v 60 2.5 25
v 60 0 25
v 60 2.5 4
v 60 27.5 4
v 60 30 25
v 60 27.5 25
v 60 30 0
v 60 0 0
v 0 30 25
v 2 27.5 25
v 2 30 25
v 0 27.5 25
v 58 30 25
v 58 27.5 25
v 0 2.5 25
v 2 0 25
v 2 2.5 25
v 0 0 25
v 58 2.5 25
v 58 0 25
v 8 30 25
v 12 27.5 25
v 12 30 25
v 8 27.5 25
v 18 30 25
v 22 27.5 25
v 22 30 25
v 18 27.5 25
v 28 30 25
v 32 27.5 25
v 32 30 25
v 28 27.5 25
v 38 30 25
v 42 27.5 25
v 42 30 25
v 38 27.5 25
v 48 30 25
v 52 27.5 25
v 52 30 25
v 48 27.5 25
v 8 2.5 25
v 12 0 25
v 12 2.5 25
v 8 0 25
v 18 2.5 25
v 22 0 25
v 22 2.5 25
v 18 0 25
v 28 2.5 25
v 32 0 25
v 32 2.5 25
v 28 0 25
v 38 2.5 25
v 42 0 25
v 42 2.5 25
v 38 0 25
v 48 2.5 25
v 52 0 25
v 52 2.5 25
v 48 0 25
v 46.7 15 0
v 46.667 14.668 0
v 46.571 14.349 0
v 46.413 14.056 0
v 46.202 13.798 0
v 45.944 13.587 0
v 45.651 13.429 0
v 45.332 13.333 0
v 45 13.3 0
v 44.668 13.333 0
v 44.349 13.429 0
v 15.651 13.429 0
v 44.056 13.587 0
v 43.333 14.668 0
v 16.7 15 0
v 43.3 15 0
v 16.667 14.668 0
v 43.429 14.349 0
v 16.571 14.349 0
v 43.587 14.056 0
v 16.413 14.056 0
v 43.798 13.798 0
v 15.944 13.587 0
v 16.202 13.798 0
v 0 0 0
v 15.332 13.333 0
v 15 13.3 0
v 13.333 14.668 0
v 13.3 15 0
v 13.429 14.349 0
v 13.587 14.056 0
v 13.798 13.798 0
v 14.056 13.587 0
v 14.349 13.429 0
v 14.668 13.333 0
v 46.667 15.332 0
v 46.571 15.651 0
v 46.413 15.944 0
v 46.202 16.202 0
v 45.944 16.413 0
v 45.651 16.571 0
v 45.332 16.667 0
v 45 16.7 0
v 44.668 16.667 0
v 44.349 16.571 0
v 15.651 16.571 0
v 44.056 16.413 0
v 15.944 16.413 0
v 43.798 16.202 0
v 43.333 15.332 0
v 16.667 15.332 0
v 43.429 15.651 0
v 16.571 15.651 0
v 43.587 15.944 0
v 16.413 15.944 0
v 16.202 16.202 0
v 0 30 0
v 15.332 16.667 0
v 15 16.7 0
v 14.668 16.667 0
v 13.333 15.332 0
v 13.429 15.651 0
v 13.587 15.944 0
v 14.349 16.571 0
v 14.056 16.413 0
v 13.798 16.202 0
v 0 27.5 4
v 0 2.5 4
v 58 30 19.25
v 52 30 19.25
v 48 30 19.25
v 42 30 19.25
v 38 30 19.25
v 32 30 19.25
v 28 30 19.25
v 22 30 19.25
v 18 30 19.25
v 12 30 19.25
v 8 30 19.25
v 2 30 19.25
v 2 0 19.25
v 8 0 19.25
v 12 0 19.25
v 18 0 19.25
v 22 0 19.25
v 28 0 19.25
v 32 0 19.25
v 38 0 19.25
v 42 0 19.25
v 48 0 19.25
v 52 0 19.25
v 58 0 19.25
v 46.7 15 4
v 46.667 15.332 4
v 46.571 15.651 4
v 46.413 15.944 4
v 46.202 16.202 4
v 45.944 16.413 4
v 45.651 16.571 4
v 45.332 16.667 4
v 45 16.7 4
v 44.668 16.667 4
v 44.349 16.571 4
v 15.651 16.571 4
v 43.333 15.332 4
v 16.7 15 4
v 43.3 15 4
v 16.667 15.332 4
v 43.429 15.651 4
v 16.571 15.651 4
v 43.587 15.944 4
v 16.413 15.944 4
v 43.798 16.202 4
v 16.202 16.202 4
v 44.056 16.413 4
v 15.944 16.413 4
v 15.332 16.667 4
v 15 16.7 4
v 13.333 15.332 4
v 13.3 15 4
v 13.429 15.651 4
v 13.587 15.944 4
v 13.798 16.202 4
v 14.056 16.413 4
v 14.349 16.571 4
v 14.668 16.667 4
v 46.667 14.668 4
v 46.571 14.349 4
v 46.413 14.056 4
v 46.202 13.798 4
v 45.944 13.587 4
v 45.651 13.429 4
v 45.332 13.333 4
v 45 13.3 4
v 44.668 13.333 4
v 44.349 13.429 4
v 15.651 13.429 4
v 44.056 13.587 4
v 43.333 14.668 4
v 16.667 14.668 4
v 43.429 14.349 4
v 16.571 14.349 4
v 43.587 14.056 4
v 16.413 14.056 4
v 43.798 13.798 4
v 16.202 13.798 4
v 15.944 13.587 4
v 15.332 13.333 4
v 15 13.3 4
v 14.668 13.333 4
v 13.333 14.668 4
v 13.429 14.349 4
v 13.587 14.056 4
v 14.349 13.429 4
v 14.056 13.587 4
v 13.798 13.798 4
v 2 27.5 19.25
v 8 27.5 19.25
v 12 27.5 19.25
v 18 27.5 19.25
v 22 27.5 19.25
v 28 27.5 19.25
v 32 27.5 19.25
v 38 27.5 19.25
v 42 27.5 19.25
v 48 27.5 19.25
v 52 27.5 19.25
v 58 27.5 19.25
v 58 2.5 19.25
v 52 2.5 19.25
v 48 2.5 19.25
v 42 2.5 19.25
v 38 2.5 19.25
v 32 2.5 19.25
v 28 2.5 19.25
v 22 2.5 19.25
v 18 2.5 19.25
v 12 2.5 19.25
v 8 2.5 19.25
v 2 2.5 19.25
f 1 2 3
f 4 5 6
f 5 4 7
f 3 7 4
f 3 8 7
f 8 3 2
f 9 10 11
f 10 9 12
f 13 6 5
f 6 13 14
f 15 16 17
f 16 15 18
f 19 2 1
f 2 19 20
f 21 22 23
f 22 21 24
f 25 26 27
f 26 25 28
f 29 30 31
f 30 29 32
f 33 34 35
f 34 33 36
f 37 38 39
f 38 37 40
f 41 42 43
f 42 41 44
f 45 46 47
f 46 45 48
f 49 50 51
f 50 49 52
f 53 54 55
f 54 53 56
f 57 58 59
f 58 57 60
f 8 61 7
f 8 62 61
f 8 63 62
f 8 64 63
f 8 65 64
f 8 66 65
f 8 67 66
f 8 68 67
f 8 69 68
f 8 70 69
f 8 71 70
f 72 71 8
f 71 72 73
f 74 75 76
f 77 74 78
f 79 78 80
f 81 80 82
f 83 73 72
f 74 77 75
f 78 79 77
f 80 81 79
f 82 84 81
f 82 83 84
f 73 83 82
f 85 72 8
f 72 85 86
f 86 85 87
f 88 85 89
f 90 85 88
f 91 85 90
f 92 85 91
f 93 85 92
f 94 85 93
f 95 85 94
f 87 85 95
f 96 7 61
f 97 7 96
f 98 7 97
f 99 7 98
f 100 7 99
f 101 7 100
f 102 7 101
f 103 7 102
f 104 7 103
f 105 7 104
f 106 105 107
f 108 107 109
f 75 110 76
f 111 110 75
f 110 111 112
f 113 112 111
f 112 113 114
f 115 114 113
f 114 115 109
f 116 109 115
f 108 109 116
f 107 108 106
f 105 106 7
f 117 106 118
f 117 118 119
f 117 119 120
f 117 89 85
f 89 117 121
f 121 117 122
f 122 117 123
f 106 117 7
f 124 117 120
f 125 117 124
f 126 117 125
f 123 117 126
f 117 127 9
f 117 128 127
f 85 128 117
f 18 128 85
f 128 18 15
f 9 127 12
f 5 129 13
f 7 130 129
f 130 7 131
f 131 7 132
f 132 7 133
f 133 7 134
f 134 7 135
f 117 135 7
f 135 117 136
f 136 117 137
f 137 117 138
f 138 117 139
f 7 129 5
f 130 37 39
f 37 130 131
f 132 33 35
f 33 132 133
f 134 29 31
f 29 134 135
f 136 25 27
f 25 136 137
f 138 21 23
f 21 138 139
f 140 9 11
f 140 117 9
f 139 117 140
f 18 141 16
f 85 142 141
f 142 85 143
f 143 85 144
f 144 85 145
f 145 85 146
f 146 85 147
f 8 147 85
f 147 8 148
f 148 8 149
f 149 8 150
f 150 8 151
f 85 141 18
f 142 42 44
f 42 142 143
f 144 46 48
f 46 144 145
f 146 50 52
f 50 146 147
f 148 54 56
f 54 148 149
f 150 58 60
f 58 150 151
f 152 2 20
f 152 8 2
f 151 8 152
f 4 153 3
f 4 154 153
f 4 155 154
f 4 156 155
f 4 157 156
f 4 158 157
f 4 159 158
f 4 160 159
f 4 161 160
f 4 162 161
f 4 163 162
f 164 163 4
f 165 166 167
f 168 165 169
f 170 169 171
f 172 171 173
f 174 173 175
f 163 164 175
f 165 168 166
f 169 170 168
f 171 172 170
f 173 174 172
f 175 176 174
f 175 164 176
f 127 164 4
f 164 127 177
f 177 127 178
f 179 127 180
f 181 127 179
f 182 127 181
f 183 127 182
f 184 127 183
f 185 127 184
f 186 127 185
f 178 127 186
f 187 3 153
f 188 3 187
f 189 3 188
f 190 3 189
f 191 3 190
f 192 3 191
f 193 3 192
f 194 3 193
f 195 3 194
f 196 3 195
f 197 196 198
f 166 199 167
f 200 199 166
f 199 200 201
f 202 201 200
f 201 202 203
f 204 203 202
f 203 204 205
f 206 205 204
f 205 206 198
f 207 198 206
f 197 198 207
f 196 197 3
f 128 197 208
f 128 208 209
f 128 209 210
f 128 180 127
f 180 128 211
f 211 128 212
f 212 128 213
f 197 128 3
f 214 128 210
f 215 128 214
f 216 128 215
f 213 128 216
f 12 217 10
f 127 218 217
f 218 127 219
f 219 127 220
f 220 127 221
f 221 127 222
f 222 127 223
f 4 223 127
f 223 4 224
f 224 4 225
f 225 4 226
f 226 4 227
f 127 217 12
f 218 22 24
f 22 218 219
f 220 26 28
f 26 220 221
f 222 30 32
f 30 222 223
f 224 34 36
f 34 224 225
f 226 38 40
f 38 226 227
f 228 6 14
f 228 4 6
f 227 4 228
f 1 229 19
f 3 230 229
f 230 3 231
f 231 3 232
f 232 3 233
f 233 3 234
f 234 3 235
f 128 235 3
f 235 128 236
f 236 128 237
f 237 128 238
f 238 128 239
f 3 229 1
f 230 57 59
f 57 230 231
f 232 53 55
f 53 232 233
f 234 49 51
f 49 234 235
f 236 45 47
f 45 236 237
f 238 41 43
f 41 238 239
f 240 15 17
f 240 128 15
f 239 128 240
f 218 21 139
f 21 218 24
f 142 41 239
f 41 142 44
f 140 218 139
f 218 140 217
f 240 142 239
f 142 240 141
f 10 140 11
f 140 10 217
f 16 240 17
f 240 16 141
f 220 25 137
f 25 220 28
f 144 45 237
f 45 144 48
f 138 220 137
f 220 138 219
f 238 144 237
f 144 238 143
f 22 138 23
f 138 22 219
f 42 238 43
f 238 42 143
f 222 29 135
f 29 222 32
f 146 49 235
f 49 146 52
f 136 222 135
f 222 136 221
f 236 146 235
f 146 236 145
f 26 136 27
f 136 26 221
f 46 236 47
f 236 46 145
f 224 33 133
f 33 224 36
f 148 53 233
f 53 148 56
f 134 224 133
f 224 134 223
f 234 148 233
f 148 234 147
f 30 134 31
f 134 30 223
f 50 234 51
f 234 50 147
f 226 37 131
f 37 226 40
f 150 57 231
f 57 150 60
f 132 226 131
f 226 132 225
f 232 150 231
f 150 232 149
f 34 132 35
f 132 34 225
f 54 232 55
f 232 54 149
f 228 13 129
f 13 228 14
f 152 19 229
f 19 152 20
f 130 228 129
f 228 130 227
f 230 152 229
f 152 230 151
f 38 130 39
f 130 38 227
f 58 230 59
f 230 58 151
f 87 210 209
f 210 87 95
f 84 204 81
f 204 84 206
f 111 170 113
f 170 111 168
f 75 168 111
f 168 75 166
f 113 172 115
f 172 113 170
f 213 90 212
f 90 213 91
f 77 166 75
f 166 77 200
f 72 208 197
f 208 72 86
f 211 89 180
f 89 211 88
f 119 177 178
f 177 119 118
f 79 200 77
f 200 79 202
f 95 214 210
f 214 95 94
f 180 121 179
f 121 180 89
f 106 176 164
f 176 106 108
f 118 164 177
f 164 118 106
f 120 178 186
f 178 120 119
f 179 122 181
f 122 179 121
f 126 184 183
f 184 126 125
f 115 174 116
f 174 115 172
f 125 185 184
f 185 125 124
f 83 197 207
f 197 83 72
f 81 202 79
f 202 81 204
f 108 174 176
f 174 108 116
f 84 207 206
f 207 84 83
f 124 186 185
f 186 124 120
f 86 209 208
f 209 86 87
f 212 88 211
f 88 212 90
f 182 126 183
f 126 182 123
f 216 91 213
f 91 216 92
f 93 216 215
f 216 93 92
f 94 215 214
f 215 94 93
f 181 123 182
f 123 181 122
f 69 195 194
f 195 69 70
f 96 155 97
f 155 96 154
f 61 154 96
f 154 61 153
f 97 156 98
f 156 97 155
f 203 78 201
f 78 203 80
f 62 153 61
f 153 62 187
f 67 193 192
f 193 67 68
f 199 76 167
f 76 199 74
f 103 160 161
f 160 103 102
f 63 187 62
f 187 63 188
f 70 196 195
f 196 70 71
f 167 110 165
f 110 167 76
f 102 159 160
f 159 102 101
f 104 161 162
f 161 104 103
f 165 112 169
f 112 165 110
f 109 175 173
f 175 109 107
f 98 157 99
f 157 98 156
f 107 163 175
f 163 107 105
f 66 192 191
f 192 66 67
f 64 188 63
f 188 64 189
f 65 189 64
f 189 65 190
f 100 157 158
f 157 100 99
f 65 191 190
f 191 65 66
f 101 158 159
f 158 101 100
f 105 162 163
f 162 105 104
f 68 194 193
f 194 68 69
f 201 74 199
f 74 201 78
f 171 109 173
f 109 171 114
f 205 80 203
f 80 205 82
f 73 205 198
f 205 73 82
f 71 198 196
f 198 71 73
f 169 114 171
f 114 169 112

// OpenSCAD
$fn = 32;

// ----------------------------------------------------------------------
// Cable duct: 60 x 30 x 25 mm, 6 fingers
// ----------------------------------------------------------------------

// --- parameters (mm) ---
channel_l = 60;           // duct length, X
channel_w = 30;           // duct width, Y
channel_h = 25;           // duct height, Z
channel_t = 2.5;          // side wall thickness
floor_t = 4;              // floor thickness
slot_w = 6;               // finger slot width
slot_h = 15.25;           // finger slot height
fingers = 6;              // number of finger slots per side
pitch = 10;               // finger pitch
hole_d = 3.4;             // floor mounting hole
hole_n = 2;               // mounting holes in the floor

module shell() {
  difference() {
    cube([channel_l, channel_w, channel_h]);
    /* open top channel */
    translate([-channel_t - 1, channel_t, floor_t])
      cube([channel_l + 2 * channel_t + 2, channel_w - 2 * channel_t, channel_h + 1]);
  }
}

difference() {
  union() {
    shell();
  }
  /* finger slots cut through both side walls */
  for (i = [0 : fingers - 1]) translate([pitch / 2 + i * pitch - slot_w / 2, -1, floor_t + slot_h]) cube([slot_w, channel_w + 2, channel_h]);
  for (i = [0 : hole_n - 1]) translate([(channel_l / hole_n) * (i + 0.5), channel_w / 2, -1]) cylinder(h = floor_t + 2, d = hole_d);
}
